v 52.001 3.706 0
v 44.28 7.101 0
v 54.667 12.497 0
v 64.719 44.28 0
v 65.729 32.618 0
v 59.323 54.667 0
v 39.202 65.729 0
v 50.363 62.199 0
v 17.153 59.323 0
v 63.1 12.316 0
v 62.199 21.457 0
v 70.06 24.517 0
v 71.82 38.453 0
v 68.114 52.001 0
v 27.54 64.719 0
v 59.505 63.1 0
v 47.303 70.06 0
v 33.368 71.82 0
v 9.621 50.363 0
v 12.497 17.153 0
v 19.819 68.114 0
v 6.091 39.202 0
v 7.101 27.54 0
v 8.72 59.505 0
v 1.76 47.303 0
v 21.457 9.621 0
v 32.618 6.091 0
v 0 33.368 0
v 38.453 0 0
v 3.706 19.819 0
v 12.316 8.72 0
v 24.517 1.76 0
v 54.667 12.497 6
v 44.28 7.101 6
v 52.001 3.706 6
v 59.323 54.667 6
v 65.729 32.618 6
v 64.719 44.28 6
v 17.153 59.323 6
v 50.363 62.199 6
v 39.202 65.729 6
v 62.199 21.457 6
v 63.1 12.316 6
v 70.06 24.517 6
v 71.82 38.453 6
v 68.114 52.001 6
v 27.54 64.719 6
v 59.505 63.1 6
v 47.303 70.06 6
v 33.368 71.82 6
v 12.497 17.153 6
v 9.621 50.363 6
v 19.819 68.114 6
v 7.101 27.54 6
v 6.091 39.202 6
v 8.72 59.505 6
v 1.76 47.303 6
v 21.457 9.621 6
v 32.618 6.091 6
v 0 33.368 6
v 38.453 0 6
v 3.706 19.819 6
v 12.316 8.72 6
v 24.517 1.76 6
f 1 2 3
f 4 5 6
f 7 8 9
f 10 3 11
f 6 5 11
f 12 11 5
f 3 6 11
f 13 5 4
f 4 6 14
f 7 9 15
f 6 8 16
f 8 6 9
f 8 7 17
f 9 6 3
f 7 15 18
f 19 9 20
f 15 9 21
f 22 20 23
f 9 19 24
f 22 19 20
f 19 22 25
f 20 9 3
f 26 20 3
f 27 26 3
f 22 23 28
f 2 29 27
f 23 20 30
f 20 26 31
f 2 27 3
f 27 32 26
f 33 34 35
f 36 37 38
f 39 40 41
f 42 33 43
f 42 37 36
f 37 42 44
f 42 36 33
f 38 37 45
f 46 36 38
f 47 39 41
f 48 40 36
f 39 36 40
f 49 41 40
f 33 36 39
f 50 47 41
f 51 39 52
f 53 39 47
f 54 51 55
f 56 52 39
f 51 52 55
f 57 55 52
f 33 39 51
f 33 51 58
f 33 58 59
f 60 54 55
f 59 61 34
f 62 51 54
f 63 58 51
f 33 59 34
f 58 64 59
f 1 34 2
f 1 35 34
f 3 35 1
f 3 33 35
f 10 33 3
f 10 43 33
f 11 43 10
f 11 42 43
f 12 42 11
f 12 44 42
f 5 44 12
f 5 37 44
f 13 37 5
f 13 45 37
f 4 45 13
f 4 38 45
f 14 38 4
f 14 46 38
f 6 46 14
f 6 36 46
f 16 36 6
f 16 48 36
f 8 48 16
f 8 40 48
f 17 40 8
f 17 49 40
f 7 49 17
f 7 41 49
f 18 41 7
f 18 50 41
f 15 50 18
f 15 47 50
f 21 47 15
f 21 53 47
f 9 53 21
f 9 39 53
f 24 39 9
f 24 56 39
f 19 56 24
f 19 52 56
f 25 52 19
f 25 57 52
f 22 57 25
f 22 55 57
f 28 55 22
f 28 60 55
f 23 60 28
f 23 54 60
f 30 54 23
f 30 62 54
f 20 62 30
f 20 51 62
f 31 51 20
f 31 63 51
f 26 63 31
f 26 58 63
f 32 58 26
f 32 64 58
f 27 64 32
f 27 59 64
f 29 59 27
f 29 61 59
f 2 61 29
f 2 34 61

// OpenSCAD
$fn = 32;

// ----------------------------------------------------------------------
// Chain sprocket: 16 teeth, 30 mm root radius
// ----------------------------------------------------------------------

// --- parameters (mm) ---
profile_height = 6;       // extrusion height
profile_points = 32;      // points of the closed outline

profile = [[65.729, 32.618], [71.82, 38.453], [64.719, 44.28], [68.114, 52.001], [59.323, 54.667], [59.505, 63.1], [50.363, 62.199], [47.303, 70.06], [39.202, 65.729], [33.368, 71.82], [27.54, 64.719], [19.819, 68.114], [17.153, 59.323], [8.72, 59.505], [9.621, 50.363], [1.76, 47.303], [6.091, 39.202], [0, 33.368], [7.101, 27.54], [3.706, 19.819], [12.497, 17.153], [12.316, 8.72], [21.457, 9.621], [24.517, 1.76], [32.618, 6.091], [38.453, 0], [44.28, 7.101], [52.001, 3.706], [54.667, 12.497], [63.1, 12.316], [62.199, 21.457], [70.06, 24.517]];  // single closed polygon, 32 points, counter clockwise

// --- the one profile operation ---
linear_extrude(height = profile_height) polygon(points = profile);
